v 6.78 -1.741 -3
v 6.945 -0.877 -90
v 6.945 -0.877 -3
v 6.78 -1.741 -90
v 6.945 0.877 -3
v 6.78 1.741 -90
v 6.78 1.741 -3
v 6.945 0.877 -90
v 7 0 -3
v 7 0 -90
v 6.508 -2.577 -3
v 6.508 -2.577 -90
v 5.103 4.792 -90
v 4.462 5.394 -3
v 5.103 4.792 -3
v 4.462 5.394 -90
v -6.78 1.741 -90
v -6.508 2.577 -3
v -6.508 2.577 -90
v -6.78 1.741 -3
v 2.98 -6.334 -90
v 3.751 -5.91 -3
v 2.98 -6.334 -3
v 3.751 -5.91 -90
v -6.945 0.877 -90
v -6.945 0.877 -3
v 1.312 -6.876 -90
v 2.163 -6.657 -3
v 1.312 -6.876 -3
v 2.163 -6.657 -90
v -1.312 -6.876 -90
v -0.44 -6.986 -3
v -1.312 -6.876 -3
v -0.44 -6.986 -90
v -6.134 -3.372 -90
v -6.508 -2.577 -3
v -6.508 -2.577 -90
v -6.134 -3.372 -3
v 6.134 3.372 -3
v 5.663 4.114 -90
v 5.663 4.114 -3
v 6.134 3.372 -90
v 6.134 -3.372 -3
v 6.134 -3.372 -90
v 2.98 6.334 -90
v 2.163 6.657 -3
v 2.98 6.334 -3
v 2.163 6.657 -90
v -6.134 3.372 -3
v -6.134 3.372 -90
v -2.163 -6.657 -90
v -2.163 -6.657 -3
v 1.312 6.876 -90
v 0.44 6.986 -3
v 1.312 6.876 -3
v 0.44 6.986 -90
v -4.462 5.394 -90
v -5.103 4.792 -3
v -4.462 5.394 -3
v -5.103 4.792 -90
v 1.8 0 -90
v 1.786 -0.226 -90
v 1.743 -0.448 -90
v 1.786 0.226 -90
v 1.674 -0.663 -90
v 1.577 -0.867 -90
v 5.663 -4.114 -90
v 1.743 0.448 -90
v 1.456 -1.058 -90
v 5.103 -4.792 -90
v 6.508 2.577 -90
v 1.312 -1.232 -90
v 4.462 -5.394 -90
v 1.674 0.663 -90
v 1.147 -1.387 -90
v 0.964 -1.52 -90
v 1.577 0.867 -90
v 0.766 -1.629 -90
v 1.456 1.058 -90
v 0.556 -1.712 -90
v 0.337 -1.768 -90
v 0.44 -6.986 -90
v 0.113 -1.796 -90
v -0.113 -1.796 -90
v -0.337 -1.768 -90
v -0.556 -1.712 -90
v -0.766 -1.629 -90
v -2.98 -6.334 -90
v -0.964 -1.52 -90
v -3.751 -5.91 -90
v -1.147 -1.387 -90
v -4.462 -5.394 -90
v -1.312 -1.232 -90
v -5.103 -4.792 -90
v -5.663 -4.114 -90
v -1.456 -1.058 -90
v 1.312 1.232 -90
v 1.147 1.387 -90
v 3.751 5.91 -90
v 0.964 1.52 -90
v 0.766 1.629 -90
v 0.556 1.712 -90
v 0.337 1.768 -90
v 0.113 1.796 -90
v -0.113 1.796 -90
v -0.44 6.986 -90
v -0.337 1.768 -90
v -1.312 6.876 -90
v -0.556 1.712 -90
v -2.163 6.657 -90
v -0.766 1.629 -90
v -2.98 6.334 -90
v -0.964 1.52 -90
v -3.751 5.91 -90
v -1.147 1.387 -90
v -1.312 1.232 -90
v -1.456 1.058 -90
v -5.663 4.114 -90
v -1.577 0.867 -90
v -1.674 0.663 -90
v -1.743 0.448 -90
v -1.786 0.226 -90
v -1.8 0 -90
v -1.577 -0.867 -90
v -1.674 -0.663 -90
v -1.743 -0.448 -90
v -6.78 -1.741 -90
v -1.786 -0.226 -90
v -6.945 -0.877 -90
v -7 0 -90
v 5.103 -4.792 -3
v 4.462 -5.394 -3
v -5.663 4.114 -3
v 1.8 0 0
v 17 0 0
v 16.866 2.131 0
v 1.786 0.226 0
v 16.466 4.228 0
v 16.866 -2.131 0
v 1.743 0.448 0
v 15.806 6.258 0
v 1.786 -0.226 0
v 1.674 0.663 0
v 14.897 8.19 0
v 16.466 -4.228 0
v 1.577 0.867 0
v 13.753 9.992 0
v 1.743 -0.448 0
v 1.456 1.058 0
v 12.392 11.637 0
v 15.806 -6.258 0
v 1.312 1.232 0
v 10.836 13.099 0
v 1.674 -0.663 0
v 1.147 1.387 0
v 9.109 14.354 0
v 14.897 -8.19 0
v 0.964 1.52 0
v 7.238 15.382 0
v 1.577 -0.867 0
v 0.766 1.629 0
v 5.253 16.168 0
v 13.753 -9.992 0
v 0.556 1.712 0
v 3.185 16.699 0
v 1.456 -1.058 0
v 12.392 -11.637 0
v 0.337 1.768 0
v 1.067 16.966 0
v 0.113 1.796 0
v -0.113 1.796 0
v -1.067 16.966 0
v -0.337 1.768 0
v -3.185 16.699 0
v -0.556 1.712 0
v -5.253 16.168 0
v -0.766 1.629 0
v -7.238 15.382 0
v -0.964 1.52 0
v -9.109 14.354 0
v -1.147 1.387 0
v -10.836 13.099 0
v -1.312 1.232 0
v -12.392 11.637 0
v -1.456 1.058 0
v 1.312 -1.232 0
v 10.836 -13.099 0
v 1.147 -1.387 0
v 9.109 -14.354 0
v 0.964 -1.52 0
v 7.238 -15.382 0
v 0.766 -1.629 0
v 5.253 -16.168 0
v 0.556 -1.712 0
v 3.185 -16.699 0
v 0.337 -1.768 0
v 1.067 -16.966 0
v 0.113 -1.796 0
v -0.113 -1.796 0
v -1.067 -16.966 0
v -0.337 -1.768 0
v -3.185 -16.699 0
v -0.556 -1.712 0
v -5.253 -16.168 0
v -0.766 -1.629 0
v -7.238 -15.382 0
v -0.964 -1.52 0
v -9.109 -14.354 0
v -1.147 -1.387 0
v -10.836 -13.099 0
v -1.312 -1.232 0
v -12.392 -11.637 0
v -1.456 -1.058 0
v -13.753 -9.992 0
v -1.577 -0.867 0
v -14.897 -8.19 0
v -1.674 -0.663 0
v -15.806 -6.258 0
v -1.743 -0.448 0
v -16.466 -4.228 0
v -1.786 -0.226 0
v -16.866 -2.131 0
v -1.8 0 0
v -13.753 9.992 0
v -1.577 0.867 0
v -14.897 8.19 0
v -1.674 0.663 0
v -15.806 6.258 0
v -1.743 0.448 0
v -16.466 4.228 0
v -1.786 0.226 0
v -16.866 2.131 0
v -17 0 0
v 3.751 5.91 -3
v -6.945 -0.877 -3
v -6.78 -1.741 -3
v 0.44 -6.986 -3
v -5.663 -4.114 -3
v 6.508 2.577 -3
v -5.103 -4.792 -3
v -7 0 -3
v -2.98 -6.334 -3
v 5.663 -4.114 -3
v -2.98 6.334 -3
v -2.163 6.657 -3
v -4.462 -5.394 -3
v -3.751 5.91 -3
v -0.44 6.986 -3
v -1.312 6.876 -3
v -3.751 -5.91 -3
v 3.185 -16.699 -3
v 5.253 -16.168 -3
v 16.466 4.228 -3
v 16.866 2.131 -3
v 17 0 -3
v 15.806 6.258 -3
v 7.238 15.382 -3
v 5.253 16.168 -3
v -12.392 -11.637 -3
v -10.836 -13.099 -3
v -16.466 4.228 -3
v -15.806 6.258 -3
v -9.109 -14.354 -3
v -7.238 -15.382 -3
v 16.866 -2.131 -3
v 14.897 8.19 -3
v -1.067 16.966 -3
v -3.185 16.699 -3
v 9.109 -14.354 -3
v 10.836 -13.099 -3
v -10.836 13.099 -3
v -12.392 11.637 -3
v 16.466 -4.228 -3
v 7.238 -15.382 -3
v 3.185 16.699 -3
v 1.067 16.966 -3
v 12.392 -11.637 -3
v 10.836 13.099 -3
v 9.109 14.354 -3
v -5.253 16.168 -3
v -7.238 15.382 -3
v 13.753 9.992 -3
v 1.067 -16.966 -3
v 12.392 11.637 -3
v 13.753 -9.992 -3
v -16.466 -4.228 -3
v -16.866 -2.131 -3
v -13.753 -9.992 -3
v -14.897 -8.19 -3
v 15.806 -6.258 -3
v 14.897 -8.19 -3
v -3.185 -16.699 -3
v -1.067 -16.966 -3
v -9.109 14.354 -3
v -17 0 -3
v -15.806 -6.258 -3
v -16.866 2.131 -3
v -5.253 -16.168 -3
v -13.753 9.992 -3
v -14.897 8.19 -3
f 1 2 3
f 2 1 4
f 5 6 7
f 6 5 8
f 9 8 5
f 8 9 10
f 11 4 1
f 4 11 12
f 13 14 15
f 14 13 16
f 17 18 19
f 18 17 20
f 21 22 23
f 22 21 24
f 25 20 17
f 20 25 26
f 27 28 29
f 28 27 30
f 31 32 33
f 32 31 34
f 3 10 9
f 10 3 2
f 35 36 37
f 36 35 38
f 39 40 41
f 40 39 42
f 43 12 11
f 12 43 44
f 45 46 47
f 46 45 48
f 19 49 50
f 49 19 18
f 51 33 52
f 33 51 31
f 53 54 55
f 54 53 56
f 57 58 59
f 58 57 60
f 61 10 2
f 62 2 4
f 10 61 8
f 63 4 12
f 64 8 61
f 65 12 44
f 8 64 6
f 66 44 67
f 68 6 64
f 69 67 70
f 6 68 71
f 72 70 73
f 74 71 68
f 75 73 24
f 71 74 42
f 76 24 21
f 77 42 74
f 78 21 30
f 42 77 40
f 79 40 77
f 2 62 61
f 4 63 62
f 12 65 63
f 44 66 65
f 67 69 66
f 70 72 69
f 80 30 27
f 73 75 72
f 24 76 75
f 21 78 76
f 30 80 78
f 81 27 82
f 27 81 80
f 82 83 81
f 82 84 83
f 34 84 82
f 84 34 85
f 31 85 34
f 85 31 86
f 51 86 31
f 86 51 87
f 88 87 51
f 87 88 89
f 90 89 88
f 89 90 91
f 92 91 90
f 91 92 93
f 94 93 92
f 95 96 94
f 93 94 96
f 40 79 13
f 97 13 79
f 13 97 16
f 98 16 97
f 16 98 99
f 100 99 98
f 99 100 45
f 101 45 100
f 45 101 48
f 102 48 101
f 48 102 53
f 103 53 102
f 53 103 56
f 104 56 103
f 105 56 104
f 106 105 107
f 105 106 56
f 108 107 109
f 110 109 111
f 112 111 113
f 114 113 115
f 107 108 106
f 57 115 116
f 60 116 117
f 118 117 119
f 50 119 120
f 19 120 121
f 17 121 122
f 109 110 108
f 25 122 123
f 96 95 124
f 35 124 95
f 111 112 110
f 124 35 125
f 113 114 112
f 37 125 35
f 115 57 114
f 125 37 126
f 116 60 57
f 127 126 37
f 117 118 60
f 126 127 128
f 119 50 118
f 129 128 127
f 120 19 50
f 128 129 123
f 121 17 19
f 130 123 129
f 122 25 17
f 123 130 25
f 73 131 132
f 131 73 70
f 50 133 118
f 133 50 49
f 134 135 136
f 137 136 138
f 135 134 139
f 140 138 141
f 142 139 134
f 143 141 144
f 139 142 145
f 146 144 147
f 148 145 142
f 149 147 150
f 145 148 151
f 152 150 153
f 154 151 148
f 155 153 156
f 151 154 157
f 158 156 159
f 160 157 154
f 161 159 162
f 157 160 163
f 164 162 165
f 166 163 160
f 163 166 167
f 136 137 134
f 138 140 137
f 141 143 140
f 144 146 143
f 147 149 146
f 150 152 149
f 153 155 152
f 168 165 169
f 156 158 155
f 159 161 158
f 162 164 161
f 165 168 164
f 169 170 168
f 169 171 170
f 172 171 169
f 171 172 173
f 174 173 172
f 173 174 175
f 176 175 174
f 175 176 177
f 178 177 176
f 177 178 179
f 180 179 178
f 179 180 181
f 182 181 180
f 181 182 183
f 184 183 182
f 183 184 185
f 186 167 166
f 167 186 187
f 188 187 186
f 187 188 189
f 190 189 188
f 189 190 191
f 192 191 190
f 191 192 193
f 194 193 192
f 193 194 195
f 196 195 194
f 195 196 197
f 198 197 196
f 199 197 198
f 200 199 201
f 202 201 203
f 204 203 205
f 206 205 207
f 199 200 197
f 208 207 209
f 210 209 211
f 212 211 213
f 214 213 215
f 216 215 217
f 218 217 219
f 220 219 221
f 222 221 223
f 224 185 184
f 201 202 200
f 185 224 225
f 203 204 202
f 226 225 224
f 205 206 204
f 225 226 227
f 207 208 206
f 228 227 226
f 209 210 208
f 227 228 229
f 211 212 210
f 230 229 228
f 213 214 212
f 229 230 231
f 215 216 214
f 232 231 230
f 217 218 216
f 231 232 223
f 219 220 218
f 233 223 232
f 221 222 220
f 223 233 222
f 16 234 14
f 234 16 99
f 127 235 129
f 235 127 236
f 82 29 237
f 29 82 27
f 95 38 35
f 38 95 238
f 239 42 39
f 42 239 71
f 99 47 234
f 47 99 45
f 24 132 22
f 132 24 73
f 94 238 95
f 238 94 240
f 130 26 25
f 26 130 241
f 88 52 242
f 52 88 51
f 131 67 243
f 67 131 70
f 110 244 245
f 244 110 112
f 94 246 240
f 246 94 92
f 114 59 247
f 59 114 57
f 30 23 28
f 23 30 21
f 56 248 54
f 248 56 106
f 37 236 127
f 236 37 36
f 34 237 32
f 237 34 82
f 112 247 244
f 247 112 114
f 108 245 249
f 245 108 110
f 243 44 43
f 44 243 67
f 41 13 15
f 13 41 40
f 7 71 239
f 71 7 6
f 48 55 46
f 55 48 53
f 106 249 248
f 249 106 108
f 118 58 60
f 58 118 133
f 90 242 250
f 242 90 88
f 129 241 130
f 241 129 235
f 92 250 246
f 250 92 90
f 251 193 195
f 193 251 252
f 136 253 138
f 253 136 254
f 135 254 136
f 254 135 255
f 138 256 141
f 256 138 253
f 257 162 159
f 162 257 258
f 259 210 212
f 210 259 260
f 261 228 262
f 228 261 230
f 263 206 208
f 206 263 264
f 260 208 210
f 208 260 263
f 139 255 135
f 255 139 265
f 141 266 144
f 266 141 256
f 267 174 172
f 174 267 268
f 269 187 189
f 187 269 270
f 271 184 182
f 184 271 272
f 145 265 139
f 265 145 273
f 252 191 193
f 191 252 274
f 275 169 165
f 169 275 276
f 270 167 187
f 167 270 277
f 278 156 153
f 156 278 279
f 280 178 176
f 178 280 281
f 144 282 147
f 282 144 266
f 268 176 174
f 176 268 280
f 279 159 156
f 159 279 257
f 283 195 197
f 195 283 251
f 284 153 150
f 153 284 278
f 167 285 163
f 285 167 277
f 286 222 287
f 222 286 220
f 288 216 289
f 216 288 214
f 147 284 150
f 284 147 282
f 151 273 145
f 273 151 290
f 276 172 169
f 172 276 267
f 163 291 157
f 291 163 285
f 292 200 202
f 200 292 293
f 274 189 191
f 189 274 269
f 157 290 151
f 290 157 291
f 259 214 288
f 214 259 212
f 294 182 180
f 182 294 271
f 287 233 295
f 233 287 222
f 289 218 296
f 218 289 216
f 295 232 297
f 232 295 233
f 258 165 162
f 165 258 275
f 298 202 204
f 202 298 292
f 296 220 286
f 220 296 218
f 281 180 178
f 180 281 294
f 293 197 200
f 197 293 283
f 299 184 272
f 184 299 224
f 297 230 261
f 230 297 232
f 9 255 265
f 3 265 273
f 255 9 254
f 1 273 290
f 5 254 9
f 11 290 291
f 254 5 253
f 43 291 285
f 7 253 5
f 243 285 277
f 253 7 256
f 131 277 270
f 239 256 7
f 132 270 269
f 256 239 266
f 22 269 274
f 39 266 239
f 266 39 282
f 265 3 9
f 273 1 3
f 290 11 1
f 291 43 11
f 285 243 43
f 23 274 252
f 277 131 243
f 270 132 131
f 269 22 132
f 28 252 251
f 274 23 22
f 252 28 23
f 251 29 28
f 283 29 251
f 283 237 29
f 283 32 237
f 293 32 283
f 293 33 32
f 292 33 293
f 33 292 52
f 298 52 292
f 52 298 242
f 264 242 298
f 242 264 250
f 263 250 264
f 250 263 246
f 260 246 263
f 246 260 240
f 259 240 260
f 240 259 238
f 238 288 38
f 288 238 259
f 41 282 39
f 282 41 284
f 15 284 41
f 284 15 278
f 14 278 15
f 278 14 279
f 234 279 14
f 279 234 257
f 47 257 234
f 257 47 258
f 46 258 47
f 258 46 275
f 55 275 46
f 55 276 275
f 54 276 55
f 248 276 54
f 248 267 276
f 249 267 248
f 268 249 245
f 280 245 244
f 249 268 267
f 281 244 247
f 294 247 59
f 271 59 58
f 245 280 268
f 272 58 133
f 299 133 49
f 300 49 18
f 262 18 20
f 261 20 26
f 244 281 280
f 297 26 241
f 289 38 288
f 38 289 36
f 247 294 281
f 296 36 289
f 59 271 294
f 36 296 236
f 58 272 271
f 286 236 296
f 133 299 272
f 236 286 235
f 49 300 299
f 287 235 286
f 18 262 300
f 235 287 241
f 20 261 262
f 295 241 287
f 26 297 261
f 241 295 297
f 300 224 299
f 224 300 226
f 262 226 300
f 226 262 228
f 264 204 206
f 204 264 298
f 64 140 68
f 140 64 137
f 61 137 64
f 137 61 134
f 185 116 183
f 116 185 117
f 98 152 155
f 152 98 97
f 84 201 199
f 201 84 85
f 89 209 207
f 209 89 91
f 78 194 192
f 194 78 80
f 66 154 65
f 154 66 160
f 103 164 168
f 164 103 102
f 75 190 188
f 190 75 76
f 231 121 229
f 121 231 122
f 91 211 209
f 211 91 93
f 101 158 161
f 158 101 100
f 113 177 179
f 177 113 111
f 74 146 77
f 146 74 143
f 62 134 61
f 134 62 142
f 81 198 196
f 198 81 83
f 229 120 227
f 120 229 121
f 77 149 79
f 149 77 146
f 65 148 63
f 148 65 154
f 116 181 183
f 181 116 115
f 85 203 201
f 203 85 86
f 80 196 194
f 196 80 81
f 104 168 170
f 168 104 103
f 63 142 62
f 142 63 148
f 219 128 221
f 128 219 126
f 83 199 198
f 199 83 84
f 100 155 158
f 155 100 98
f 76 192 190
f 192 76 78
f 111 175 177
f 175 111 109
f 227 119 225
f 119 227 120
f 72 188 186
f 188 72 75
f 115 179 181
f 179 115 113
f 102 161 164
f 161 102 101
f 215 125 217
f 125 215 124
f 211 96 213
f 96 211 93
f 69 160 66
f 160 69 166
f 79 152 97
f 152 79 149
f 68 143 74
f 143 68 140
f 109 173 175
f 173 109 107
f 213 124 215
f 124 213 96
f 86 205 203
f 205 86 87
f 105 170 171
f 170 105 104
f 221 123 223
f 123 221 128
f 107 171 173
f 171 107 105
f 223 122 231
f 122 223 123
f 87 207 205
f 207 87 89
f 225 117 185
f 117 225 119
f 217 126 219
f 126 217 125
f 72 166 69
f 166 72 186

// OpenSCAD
$fn = 50;


difference() {
	union() {
		translate(v = [0, 0, -90.0000000000]) {
			cylinder(h = 90, r = 7.0000000000);
		}
		translate(v = [0, 0, -3.0000000000]) {
			cylinder(h = 3, r = 17.0000000000);
		}
	}
	union() {
		#translate(v = [0, 0, -90]) {
			cylinder(h = 90, r = 1.8000000000);
		}
	}
}
